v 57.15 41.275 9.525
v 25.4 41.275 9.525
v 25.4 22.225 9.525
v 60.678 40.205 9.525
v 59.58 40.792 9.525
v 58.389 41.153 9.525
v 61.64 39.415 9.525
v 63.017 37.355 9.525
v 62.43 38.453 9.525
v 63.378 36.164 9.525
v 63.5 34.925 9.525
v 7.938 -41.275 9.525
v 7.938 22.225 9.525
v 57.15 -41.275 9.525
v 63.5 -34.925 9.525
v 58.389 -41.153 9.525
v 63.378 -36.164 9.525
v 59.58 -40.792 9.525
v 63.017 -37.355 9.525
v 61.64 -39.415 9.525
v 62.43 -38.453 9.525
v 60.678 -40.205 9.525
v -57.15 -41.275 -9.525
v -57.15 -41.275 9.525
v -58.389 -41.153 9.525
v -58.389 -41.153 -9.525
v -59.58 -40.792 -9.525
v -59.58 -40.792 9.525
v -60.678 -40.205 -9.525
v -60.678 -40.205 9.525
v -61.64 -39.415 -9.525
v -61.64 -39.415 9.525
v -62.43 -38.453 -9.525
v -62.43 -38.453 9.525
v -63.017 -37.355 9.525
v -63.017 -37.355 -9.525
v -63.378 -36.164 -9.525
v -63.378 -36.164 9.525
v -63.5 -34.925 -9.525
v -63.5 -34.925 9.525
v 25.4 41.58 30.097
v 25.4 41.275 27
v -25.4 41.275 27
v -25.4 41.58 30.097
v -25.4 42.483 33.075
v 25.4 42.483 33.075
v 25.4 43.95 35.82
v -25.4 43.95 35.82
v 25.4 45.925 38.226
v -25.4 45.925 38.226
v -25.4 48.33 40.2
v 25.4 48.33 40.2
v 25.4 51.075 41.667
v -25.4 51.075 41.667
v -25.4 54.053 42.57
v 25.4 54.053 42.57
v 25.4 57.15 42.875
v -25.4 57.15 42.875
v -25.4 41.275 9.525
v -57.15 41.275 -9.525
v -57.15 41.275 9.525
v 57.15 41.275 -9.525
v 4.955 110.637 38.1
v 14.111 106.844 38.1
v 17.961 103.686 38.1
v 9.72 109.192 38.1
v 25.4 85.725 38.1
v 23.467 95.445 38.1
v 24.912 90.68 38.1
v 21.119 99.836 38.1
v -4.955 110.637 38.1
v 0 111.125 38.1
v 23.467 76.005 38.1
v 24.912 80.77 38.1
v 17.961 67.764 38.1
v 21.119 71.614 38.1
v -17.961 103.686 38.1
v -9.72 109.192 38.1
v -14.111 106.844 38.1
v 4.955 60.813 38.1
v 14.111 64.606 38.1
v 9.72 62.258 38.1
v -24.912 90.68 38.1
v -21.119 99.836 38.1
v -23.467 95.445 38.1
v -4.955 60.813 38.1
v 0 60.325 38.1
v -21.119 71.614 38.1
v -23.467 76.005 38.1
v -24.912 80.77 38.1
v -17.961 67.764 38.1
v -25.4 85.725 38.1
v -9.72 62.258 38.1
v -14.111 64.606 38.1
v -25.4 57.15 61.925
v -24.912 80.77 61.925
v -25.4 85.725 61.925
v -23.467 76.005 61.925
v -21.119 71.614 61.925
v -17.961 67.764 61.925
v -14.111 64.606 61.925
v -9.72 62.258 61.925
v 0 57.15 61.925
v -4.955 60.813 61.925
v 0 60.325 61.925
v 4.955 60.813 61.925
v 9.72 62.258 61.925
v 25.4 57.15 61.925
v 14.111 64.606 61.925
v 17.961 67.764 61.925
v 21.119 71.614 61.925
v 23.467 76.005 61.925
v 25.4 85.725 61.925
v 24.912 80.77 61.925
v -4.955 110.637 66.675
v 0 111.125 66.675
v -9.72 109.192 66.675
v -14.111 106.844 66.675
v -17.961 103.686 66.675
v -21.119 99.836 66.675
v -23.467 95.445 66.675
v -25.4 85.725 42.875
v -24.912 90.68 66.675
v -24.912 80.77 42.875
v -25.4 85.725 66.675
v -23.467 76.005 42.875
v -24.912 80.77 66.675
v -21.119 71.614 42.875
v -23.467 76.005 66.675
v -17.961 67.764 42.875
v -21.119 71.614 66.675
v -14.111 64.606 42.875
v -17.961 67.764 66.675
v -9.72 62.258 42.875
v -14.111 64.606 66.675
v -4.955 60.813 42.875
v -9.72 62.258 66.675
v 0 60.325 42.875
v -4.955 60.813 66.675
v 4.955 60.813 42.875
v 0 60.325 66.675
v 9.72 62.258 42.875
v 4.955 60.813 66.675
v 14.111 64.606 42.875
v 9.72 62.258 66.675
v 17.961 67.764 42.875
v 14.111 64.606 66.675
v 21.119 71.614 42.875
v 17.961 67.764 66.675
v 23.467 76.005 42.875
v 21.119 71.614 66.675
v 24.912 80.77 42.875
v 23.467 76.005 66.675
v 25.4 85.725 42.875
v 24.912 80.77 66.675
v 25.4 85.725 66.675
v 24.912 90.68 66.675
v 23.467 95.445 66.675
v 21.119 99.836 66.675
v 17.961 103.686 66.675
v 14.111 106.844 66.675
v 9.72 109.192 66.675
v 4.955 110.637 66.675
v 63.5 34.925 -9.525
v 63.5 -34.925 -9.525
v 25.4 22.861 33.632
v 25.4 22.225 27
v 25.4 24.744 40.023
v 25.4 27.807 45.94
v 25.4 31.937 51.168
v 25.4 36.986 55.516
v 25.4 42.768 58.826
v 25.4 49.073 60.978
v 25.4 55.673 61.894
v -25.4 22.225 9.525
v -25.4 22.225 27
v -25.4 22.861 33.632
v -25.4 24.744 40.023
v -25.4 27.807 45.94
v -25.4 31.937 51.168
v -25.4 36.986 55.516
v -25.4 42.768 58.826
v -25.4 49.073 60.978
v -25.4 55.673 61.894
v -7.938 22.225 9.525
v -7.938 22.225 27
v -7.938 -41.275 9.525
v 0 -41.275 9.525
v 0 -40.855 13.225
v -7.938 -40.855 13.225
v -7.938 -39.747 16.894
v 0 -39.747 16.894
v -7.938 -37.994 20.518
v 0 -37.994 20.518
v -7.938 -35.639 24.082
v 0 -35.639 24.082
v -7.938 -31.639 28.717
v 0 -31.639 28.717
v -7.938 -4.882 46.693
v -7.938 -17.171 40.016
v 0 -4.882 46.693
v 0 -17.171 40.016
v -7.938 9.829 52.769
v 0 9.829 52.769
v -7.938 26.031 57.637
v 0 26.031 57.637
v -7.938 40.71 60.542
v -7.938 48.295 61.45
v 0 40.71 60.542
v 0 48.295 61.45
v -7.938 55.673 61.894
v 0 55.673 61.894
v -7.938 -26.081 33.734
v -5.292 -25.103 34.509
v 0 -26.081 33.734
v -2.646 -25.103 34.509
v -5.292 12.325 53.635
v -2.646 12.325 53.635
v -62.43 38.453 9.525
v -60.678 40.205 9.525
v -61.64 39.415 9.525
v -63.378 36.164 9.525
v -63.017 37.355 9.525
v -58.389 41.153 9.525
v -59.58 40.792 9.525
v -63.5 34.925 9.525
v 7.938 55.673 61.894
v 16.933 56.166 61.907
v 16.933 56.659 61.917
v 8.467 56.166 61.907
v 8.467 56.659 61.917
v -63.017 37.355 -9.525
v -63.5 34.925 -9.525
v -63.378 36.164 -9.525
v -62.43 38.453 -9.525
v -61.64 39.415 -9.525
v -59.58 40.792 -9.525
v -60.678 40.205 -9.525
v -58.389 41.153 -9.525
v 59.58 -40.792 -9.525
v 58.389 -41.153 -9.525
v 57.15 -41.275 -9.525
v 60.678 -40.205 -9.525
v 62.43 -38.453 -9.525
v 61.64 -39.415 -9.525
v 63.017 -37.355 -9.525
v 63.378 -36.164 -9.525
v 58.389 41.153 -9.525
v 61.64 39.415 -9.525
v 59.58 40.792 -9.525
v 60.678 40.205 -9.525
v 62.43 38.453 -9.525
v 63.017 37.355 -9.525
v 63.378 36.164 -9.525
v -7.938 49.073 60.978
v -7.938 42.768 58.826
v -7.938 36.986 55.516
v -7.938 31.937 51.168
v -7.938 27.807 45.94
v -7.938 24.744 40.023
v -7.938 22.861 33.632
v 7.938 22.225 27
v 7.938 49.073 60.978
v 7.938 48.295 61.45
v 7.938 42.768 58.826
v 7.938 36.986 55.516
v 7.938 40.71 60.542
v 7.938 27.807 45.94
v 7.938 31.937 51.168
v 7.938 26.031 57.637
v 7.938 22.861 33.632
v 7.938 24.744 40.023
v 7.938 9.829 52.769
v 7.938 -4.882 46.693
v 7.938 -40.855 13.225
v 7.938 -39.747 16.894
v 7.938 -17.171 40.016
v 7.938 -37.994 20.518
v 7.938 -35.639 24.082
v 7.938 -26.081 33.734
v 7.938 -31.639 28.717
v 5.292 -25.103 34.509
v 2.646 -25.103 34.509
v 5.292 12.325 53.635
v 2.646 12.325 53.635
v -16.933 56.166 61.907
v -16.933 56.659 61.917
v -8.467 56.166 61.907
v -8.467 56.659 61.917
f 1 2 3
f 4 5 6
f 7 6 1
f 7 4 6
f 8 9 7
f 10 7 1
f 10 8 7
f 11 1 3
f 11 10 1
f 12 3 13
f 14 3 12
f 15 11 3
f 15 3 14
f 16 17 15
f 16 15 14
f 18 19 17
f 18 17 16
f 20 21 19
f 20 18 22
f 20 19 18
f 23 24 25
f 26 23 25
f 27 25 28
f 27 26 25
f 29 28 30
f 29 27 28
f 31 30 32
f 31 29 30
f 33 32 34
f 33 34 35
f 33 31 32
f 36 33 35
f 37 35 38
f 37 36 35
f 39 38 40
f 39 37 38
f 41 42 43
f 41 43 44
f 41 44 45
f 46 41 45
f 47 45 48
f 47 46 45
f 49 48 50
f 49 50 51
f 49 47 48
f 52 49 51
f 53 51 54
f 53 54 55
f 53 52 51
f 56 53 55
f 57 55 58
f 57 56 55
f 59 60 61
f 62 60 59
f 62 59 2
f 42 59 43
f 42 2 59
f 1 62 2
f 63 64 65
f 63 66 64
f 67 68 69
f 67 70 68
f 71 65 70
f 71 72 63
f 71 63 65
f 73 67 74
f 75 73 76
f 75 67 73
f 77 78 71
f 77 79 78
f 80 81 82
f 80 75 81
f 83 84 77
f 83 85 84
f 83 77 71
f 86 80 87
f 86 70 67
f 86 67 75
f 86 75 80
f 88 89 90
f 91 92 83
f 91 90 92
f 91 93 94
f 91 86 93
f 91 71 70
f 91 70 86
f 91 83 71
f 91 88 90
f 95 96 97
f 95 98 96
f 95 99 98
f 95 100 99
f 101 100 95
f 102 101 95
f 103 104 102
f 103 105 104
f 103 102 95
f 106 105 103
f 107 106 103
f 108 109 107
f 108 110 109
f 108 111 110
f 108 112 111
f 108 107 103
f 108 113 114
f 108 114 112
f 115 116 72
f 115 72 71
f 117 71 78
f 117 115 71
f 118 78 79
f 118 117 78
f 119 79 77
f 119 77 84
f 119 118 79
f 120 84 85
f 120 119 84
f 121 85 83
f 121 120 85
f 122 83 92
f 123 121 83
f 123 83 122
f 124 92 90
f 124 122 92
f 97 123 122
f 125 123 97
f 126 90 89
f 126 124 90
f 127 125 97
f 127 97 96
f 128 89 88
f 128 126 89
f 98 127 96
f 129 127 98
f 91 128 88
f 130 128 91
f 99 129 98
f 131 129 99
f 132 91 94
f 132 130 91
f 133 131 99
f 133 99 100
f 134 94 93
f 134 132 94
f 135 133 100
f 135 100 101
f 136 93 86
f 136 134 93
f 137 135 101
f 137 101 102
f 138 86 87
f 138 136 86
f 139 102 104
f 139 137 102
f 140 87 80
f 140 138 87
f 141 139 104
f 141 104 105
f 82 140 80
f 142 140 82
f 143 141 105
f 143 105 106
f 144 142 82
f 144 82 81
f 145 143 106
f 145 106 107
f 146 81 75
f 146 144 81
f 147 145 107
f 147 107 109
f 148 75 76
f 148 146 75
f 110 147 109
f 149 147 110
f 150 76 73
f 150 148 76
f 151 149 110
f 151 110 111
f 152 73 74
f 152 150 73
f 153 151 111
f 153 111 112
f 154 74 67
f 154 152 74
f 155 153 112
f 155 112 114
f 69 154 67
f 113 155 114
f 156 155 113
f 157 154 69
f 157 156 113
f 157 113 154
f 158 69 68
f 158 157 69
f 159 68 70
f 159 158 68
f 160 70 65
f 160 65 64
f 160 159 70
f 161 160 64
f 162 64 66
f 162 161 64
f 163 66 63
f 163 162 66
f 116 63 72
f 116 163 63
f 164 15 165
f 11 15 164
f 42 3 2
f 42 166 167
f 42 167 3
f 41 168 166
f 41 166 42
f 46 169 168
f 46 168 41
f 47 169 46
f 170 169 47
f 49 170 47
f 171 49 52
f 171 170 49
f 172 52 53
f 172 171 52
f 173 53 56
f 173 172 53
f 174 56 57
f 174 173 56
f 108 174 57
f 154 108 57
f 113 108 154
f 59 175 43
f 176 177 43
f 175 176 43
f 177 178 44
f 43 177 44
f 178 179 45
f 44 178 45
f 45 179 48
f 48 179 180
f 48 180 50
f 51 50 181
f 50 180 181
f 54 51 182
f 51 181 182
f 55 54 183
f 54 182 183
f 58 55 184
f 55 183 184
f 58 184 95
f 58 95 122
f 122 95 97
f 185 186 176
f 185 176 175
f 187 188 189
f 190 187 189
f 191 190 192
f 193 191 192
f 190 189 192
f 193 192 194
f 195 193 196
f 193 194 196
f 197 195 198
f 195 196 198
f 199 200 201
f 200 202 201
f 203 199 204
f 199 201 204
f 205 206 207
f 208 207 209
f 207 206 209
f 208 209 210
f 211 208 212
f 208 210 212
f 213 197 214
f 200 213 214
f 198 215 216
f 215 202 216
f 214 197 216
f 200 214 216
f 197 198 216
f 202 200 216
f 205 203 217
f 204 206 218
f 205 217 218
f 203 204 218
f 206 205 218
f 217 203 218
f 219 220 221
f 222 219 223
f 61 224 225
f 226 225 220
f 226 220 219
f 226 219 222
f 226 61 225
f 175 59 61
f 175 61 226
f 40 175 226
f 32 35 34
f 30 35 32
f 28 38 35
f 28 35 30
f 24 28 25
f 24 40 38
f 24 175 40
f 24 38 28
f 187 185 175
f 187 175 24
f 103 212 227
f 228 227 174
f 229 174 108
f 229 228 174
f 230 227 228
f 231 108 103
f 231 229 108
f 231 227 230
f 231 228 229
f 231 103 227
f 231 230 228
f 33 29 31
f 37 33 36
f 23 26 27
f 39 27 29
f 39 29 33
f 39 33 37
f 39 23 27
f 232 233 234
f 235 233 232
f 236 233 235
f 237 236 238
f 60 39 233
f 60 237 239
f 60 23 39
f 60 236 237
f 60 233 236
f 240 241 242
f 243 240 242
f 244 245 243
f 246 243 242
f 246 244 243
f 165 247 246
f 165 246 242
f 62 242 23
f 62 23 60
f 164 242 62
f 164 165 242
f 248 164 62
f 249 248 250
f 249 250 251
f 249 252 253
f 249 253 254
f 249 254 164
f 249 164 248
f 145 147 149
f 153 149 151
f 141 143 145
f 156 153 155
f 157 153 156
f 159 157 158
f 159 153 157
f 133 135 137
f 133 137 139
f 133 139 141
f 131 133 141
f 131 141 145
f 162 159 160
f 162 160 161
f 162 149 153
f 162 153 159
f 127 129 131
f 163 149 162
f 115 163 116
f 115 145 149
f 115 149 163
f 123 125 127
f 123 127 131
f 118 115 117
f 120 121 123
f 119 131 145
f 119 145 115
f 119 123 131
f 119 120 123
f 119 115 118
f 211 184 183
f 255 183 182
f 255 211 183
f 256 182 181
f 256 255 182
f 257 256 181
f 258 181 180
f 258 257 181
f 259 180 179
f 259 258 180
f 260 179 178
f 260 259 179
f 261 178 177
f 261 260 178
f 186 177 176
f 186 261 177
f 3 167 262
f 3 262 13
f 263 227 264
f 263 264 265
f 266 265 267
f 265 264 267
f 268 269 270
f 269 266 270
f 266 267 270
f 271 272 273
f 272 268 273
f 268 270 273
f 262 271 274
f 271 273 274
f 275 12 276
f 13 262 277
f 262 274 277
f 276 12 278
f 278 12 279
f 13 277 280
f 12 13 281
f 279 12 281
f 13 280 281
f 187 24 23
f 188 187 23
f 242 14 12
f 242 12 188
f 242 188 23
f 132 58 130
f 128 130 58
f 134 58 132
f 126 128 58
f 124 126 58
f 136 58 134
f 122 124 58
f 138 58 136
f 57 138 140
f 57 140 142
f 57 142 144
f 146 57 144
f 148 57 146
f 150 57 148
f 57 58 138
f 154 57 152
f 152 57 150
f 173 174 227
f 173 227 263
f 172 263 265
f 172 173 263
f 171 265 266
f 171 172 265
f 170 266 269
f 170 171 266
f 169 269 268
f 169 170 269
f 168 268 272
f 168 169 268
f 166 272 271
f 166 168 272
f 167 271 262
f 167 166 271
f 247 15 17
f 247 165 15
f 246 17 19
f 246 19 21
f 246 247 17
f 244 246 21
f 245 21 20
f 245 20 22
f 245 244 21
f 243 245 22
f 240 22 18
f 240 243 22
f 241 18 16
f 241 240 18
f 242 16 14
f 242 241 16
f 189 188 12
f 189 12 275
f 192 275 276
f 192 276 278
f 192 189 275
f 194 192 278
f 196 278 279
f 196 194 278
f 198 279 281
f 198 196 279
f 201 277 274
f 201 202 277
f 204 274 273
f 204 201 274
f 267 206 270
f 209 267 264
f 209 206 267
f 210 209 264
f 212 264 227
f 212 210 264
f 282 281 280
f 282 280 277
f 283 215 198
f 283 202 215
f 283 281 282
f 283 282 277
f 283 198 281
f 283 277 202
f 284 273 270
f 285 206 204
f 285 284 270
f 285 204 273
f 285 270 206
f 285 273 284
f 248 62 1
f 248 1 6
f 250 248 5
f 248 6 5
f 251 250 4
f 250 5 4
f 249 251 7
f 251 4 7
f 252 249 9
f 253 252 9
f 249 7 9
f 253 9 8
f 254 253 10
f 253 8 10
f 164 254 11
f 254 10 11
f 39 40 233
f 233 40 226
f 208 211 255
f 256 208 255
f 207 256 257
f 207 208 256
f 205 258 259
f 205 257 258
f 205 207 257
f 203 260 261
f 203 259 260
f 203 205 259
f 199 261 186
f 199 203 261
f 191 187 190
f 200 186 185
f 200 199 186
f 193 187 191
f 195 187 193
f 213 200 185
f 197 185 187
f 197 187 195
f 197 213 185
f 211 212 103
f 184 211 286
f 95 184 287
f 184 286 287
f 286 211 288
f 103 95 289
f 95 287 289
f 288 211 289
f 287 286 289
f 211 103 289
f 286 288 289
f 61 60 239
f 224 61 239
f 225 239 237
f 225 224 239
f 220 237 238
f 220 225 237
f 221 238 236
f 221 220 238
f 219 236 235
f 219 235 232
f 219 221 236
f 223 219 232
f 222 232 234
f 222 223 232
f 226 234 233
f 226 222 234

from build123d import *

# Parameters (mm, degrees)
F1_DEPTH = 63.5
F0_W     = 25.4
F0_H     = 19.05
F2_DEPTH = 25.4
F3_DEPTH = 7.9375
F5_R     = 6.35


with BuildPart() as f1:
    # F0 (on Right) → F1 (new body, symmetric)
    with BuildSketch(Plane.YZ):
        Polygon((-41.275, 9.525), (-41.275, -9.525), (41.275, -9.525), (41.275, 9.525), (22.225, 9.525), align=None)
    extrude(amount=F1_DEPTH, both=True)

    # F0 (on Right) → F2 (join, symmetric)
    with BuildSketch(Plane.YZ):
        with BuildLine():
            Line((22.225, 9.525), (41.275, 9.525))
            Line((41.275, 9.525), (41.275, 27.0002))
            ThreePointArc((41.275, 27.0002), (45.9246798487, 38.2255201513), (57.15, 42.8752))
            Line((57.15, 42.8752), (60.325, 42.8752))
            Line((60.325, 42.8752), (60.325, 61.9252))
            Line((60.325, 61.9252), (57.15, 61.9252))
            add(Edge.make_bspline(
                [(55.6725300952, 61.8939345046), (56.1670957389, 61.9078019398), (56.659625513, 61.9182367743), (57.15, 61.9252)],
                knots=[110.1817471717, 110.1817471717, 110.1817471717, 110.1817471717, 111.5045361635, 111.5045361635, 111.5045361635, 111.5045361635], degree=3))
            ThreePointArc((55.6725300952, 61.8939345046), (31.9373418555, 51.1678952622), (22.225, 27.0002))
            Line((22.225, 27.0002), (22.225, 9.525))
        make_face()
        with Locations((73.025, 52.4002)):
            Rectangle(F0_W, F0_H)
    extrude(amount=F2_DEPTH, both=True)

    # F0 (on Right) → F3 (join, symmetric)
    with BuildSketch(Plane.YZ):
        with BuildLine():
            add(Edge.make_bspline(
                [(-41.275, 9.525), (-40.8421786734, 35.7681623922), (14.4776705555, 60.7388460936), (55.6725300952, 61.8939345046)],
                knots=[0, 0, 0, 0, 110.1817471717, 110.1817471717, 110.1817471717, 110.1817471717], degree=3))
            Line((-41.275, 9.525), (22.225, 9.525))
            Line((22.225, 9.525), (22.225, 27.0002))
            ThreePointArc((22.225, 27.0002), (31.9373418555, 51.1678952622), (55.6725300952, 61.8939345046))
        make_face()
    extrude(amount=F3_DEPTH, both=True)

    # F0 (on Right) → F4 (revolve)
    with BuildSketch(Plane.YZ):
        Polygon((85.725, 66.675), (85.725, 61.9252), (85.725, 42.8752), (85.725, 38.1), (111.125, 38.1), (111.125, 66.675), align=None)
    revolve(axis=Axis((0, 85.725, 52.3875), (0, 0, 1)))

    # F5
    f5_edges = [f1.edges().sort_by_distance(p)[0] for p in [
        (63.5, 41.275, 0),
        (63.5, -41.275, 0),
        (-63.5, 41.275, 0),
        (-63.5, -41.275, 0),
    ]]
    fillet(f5_edges, radius=F5_R)


solid = f1.part
